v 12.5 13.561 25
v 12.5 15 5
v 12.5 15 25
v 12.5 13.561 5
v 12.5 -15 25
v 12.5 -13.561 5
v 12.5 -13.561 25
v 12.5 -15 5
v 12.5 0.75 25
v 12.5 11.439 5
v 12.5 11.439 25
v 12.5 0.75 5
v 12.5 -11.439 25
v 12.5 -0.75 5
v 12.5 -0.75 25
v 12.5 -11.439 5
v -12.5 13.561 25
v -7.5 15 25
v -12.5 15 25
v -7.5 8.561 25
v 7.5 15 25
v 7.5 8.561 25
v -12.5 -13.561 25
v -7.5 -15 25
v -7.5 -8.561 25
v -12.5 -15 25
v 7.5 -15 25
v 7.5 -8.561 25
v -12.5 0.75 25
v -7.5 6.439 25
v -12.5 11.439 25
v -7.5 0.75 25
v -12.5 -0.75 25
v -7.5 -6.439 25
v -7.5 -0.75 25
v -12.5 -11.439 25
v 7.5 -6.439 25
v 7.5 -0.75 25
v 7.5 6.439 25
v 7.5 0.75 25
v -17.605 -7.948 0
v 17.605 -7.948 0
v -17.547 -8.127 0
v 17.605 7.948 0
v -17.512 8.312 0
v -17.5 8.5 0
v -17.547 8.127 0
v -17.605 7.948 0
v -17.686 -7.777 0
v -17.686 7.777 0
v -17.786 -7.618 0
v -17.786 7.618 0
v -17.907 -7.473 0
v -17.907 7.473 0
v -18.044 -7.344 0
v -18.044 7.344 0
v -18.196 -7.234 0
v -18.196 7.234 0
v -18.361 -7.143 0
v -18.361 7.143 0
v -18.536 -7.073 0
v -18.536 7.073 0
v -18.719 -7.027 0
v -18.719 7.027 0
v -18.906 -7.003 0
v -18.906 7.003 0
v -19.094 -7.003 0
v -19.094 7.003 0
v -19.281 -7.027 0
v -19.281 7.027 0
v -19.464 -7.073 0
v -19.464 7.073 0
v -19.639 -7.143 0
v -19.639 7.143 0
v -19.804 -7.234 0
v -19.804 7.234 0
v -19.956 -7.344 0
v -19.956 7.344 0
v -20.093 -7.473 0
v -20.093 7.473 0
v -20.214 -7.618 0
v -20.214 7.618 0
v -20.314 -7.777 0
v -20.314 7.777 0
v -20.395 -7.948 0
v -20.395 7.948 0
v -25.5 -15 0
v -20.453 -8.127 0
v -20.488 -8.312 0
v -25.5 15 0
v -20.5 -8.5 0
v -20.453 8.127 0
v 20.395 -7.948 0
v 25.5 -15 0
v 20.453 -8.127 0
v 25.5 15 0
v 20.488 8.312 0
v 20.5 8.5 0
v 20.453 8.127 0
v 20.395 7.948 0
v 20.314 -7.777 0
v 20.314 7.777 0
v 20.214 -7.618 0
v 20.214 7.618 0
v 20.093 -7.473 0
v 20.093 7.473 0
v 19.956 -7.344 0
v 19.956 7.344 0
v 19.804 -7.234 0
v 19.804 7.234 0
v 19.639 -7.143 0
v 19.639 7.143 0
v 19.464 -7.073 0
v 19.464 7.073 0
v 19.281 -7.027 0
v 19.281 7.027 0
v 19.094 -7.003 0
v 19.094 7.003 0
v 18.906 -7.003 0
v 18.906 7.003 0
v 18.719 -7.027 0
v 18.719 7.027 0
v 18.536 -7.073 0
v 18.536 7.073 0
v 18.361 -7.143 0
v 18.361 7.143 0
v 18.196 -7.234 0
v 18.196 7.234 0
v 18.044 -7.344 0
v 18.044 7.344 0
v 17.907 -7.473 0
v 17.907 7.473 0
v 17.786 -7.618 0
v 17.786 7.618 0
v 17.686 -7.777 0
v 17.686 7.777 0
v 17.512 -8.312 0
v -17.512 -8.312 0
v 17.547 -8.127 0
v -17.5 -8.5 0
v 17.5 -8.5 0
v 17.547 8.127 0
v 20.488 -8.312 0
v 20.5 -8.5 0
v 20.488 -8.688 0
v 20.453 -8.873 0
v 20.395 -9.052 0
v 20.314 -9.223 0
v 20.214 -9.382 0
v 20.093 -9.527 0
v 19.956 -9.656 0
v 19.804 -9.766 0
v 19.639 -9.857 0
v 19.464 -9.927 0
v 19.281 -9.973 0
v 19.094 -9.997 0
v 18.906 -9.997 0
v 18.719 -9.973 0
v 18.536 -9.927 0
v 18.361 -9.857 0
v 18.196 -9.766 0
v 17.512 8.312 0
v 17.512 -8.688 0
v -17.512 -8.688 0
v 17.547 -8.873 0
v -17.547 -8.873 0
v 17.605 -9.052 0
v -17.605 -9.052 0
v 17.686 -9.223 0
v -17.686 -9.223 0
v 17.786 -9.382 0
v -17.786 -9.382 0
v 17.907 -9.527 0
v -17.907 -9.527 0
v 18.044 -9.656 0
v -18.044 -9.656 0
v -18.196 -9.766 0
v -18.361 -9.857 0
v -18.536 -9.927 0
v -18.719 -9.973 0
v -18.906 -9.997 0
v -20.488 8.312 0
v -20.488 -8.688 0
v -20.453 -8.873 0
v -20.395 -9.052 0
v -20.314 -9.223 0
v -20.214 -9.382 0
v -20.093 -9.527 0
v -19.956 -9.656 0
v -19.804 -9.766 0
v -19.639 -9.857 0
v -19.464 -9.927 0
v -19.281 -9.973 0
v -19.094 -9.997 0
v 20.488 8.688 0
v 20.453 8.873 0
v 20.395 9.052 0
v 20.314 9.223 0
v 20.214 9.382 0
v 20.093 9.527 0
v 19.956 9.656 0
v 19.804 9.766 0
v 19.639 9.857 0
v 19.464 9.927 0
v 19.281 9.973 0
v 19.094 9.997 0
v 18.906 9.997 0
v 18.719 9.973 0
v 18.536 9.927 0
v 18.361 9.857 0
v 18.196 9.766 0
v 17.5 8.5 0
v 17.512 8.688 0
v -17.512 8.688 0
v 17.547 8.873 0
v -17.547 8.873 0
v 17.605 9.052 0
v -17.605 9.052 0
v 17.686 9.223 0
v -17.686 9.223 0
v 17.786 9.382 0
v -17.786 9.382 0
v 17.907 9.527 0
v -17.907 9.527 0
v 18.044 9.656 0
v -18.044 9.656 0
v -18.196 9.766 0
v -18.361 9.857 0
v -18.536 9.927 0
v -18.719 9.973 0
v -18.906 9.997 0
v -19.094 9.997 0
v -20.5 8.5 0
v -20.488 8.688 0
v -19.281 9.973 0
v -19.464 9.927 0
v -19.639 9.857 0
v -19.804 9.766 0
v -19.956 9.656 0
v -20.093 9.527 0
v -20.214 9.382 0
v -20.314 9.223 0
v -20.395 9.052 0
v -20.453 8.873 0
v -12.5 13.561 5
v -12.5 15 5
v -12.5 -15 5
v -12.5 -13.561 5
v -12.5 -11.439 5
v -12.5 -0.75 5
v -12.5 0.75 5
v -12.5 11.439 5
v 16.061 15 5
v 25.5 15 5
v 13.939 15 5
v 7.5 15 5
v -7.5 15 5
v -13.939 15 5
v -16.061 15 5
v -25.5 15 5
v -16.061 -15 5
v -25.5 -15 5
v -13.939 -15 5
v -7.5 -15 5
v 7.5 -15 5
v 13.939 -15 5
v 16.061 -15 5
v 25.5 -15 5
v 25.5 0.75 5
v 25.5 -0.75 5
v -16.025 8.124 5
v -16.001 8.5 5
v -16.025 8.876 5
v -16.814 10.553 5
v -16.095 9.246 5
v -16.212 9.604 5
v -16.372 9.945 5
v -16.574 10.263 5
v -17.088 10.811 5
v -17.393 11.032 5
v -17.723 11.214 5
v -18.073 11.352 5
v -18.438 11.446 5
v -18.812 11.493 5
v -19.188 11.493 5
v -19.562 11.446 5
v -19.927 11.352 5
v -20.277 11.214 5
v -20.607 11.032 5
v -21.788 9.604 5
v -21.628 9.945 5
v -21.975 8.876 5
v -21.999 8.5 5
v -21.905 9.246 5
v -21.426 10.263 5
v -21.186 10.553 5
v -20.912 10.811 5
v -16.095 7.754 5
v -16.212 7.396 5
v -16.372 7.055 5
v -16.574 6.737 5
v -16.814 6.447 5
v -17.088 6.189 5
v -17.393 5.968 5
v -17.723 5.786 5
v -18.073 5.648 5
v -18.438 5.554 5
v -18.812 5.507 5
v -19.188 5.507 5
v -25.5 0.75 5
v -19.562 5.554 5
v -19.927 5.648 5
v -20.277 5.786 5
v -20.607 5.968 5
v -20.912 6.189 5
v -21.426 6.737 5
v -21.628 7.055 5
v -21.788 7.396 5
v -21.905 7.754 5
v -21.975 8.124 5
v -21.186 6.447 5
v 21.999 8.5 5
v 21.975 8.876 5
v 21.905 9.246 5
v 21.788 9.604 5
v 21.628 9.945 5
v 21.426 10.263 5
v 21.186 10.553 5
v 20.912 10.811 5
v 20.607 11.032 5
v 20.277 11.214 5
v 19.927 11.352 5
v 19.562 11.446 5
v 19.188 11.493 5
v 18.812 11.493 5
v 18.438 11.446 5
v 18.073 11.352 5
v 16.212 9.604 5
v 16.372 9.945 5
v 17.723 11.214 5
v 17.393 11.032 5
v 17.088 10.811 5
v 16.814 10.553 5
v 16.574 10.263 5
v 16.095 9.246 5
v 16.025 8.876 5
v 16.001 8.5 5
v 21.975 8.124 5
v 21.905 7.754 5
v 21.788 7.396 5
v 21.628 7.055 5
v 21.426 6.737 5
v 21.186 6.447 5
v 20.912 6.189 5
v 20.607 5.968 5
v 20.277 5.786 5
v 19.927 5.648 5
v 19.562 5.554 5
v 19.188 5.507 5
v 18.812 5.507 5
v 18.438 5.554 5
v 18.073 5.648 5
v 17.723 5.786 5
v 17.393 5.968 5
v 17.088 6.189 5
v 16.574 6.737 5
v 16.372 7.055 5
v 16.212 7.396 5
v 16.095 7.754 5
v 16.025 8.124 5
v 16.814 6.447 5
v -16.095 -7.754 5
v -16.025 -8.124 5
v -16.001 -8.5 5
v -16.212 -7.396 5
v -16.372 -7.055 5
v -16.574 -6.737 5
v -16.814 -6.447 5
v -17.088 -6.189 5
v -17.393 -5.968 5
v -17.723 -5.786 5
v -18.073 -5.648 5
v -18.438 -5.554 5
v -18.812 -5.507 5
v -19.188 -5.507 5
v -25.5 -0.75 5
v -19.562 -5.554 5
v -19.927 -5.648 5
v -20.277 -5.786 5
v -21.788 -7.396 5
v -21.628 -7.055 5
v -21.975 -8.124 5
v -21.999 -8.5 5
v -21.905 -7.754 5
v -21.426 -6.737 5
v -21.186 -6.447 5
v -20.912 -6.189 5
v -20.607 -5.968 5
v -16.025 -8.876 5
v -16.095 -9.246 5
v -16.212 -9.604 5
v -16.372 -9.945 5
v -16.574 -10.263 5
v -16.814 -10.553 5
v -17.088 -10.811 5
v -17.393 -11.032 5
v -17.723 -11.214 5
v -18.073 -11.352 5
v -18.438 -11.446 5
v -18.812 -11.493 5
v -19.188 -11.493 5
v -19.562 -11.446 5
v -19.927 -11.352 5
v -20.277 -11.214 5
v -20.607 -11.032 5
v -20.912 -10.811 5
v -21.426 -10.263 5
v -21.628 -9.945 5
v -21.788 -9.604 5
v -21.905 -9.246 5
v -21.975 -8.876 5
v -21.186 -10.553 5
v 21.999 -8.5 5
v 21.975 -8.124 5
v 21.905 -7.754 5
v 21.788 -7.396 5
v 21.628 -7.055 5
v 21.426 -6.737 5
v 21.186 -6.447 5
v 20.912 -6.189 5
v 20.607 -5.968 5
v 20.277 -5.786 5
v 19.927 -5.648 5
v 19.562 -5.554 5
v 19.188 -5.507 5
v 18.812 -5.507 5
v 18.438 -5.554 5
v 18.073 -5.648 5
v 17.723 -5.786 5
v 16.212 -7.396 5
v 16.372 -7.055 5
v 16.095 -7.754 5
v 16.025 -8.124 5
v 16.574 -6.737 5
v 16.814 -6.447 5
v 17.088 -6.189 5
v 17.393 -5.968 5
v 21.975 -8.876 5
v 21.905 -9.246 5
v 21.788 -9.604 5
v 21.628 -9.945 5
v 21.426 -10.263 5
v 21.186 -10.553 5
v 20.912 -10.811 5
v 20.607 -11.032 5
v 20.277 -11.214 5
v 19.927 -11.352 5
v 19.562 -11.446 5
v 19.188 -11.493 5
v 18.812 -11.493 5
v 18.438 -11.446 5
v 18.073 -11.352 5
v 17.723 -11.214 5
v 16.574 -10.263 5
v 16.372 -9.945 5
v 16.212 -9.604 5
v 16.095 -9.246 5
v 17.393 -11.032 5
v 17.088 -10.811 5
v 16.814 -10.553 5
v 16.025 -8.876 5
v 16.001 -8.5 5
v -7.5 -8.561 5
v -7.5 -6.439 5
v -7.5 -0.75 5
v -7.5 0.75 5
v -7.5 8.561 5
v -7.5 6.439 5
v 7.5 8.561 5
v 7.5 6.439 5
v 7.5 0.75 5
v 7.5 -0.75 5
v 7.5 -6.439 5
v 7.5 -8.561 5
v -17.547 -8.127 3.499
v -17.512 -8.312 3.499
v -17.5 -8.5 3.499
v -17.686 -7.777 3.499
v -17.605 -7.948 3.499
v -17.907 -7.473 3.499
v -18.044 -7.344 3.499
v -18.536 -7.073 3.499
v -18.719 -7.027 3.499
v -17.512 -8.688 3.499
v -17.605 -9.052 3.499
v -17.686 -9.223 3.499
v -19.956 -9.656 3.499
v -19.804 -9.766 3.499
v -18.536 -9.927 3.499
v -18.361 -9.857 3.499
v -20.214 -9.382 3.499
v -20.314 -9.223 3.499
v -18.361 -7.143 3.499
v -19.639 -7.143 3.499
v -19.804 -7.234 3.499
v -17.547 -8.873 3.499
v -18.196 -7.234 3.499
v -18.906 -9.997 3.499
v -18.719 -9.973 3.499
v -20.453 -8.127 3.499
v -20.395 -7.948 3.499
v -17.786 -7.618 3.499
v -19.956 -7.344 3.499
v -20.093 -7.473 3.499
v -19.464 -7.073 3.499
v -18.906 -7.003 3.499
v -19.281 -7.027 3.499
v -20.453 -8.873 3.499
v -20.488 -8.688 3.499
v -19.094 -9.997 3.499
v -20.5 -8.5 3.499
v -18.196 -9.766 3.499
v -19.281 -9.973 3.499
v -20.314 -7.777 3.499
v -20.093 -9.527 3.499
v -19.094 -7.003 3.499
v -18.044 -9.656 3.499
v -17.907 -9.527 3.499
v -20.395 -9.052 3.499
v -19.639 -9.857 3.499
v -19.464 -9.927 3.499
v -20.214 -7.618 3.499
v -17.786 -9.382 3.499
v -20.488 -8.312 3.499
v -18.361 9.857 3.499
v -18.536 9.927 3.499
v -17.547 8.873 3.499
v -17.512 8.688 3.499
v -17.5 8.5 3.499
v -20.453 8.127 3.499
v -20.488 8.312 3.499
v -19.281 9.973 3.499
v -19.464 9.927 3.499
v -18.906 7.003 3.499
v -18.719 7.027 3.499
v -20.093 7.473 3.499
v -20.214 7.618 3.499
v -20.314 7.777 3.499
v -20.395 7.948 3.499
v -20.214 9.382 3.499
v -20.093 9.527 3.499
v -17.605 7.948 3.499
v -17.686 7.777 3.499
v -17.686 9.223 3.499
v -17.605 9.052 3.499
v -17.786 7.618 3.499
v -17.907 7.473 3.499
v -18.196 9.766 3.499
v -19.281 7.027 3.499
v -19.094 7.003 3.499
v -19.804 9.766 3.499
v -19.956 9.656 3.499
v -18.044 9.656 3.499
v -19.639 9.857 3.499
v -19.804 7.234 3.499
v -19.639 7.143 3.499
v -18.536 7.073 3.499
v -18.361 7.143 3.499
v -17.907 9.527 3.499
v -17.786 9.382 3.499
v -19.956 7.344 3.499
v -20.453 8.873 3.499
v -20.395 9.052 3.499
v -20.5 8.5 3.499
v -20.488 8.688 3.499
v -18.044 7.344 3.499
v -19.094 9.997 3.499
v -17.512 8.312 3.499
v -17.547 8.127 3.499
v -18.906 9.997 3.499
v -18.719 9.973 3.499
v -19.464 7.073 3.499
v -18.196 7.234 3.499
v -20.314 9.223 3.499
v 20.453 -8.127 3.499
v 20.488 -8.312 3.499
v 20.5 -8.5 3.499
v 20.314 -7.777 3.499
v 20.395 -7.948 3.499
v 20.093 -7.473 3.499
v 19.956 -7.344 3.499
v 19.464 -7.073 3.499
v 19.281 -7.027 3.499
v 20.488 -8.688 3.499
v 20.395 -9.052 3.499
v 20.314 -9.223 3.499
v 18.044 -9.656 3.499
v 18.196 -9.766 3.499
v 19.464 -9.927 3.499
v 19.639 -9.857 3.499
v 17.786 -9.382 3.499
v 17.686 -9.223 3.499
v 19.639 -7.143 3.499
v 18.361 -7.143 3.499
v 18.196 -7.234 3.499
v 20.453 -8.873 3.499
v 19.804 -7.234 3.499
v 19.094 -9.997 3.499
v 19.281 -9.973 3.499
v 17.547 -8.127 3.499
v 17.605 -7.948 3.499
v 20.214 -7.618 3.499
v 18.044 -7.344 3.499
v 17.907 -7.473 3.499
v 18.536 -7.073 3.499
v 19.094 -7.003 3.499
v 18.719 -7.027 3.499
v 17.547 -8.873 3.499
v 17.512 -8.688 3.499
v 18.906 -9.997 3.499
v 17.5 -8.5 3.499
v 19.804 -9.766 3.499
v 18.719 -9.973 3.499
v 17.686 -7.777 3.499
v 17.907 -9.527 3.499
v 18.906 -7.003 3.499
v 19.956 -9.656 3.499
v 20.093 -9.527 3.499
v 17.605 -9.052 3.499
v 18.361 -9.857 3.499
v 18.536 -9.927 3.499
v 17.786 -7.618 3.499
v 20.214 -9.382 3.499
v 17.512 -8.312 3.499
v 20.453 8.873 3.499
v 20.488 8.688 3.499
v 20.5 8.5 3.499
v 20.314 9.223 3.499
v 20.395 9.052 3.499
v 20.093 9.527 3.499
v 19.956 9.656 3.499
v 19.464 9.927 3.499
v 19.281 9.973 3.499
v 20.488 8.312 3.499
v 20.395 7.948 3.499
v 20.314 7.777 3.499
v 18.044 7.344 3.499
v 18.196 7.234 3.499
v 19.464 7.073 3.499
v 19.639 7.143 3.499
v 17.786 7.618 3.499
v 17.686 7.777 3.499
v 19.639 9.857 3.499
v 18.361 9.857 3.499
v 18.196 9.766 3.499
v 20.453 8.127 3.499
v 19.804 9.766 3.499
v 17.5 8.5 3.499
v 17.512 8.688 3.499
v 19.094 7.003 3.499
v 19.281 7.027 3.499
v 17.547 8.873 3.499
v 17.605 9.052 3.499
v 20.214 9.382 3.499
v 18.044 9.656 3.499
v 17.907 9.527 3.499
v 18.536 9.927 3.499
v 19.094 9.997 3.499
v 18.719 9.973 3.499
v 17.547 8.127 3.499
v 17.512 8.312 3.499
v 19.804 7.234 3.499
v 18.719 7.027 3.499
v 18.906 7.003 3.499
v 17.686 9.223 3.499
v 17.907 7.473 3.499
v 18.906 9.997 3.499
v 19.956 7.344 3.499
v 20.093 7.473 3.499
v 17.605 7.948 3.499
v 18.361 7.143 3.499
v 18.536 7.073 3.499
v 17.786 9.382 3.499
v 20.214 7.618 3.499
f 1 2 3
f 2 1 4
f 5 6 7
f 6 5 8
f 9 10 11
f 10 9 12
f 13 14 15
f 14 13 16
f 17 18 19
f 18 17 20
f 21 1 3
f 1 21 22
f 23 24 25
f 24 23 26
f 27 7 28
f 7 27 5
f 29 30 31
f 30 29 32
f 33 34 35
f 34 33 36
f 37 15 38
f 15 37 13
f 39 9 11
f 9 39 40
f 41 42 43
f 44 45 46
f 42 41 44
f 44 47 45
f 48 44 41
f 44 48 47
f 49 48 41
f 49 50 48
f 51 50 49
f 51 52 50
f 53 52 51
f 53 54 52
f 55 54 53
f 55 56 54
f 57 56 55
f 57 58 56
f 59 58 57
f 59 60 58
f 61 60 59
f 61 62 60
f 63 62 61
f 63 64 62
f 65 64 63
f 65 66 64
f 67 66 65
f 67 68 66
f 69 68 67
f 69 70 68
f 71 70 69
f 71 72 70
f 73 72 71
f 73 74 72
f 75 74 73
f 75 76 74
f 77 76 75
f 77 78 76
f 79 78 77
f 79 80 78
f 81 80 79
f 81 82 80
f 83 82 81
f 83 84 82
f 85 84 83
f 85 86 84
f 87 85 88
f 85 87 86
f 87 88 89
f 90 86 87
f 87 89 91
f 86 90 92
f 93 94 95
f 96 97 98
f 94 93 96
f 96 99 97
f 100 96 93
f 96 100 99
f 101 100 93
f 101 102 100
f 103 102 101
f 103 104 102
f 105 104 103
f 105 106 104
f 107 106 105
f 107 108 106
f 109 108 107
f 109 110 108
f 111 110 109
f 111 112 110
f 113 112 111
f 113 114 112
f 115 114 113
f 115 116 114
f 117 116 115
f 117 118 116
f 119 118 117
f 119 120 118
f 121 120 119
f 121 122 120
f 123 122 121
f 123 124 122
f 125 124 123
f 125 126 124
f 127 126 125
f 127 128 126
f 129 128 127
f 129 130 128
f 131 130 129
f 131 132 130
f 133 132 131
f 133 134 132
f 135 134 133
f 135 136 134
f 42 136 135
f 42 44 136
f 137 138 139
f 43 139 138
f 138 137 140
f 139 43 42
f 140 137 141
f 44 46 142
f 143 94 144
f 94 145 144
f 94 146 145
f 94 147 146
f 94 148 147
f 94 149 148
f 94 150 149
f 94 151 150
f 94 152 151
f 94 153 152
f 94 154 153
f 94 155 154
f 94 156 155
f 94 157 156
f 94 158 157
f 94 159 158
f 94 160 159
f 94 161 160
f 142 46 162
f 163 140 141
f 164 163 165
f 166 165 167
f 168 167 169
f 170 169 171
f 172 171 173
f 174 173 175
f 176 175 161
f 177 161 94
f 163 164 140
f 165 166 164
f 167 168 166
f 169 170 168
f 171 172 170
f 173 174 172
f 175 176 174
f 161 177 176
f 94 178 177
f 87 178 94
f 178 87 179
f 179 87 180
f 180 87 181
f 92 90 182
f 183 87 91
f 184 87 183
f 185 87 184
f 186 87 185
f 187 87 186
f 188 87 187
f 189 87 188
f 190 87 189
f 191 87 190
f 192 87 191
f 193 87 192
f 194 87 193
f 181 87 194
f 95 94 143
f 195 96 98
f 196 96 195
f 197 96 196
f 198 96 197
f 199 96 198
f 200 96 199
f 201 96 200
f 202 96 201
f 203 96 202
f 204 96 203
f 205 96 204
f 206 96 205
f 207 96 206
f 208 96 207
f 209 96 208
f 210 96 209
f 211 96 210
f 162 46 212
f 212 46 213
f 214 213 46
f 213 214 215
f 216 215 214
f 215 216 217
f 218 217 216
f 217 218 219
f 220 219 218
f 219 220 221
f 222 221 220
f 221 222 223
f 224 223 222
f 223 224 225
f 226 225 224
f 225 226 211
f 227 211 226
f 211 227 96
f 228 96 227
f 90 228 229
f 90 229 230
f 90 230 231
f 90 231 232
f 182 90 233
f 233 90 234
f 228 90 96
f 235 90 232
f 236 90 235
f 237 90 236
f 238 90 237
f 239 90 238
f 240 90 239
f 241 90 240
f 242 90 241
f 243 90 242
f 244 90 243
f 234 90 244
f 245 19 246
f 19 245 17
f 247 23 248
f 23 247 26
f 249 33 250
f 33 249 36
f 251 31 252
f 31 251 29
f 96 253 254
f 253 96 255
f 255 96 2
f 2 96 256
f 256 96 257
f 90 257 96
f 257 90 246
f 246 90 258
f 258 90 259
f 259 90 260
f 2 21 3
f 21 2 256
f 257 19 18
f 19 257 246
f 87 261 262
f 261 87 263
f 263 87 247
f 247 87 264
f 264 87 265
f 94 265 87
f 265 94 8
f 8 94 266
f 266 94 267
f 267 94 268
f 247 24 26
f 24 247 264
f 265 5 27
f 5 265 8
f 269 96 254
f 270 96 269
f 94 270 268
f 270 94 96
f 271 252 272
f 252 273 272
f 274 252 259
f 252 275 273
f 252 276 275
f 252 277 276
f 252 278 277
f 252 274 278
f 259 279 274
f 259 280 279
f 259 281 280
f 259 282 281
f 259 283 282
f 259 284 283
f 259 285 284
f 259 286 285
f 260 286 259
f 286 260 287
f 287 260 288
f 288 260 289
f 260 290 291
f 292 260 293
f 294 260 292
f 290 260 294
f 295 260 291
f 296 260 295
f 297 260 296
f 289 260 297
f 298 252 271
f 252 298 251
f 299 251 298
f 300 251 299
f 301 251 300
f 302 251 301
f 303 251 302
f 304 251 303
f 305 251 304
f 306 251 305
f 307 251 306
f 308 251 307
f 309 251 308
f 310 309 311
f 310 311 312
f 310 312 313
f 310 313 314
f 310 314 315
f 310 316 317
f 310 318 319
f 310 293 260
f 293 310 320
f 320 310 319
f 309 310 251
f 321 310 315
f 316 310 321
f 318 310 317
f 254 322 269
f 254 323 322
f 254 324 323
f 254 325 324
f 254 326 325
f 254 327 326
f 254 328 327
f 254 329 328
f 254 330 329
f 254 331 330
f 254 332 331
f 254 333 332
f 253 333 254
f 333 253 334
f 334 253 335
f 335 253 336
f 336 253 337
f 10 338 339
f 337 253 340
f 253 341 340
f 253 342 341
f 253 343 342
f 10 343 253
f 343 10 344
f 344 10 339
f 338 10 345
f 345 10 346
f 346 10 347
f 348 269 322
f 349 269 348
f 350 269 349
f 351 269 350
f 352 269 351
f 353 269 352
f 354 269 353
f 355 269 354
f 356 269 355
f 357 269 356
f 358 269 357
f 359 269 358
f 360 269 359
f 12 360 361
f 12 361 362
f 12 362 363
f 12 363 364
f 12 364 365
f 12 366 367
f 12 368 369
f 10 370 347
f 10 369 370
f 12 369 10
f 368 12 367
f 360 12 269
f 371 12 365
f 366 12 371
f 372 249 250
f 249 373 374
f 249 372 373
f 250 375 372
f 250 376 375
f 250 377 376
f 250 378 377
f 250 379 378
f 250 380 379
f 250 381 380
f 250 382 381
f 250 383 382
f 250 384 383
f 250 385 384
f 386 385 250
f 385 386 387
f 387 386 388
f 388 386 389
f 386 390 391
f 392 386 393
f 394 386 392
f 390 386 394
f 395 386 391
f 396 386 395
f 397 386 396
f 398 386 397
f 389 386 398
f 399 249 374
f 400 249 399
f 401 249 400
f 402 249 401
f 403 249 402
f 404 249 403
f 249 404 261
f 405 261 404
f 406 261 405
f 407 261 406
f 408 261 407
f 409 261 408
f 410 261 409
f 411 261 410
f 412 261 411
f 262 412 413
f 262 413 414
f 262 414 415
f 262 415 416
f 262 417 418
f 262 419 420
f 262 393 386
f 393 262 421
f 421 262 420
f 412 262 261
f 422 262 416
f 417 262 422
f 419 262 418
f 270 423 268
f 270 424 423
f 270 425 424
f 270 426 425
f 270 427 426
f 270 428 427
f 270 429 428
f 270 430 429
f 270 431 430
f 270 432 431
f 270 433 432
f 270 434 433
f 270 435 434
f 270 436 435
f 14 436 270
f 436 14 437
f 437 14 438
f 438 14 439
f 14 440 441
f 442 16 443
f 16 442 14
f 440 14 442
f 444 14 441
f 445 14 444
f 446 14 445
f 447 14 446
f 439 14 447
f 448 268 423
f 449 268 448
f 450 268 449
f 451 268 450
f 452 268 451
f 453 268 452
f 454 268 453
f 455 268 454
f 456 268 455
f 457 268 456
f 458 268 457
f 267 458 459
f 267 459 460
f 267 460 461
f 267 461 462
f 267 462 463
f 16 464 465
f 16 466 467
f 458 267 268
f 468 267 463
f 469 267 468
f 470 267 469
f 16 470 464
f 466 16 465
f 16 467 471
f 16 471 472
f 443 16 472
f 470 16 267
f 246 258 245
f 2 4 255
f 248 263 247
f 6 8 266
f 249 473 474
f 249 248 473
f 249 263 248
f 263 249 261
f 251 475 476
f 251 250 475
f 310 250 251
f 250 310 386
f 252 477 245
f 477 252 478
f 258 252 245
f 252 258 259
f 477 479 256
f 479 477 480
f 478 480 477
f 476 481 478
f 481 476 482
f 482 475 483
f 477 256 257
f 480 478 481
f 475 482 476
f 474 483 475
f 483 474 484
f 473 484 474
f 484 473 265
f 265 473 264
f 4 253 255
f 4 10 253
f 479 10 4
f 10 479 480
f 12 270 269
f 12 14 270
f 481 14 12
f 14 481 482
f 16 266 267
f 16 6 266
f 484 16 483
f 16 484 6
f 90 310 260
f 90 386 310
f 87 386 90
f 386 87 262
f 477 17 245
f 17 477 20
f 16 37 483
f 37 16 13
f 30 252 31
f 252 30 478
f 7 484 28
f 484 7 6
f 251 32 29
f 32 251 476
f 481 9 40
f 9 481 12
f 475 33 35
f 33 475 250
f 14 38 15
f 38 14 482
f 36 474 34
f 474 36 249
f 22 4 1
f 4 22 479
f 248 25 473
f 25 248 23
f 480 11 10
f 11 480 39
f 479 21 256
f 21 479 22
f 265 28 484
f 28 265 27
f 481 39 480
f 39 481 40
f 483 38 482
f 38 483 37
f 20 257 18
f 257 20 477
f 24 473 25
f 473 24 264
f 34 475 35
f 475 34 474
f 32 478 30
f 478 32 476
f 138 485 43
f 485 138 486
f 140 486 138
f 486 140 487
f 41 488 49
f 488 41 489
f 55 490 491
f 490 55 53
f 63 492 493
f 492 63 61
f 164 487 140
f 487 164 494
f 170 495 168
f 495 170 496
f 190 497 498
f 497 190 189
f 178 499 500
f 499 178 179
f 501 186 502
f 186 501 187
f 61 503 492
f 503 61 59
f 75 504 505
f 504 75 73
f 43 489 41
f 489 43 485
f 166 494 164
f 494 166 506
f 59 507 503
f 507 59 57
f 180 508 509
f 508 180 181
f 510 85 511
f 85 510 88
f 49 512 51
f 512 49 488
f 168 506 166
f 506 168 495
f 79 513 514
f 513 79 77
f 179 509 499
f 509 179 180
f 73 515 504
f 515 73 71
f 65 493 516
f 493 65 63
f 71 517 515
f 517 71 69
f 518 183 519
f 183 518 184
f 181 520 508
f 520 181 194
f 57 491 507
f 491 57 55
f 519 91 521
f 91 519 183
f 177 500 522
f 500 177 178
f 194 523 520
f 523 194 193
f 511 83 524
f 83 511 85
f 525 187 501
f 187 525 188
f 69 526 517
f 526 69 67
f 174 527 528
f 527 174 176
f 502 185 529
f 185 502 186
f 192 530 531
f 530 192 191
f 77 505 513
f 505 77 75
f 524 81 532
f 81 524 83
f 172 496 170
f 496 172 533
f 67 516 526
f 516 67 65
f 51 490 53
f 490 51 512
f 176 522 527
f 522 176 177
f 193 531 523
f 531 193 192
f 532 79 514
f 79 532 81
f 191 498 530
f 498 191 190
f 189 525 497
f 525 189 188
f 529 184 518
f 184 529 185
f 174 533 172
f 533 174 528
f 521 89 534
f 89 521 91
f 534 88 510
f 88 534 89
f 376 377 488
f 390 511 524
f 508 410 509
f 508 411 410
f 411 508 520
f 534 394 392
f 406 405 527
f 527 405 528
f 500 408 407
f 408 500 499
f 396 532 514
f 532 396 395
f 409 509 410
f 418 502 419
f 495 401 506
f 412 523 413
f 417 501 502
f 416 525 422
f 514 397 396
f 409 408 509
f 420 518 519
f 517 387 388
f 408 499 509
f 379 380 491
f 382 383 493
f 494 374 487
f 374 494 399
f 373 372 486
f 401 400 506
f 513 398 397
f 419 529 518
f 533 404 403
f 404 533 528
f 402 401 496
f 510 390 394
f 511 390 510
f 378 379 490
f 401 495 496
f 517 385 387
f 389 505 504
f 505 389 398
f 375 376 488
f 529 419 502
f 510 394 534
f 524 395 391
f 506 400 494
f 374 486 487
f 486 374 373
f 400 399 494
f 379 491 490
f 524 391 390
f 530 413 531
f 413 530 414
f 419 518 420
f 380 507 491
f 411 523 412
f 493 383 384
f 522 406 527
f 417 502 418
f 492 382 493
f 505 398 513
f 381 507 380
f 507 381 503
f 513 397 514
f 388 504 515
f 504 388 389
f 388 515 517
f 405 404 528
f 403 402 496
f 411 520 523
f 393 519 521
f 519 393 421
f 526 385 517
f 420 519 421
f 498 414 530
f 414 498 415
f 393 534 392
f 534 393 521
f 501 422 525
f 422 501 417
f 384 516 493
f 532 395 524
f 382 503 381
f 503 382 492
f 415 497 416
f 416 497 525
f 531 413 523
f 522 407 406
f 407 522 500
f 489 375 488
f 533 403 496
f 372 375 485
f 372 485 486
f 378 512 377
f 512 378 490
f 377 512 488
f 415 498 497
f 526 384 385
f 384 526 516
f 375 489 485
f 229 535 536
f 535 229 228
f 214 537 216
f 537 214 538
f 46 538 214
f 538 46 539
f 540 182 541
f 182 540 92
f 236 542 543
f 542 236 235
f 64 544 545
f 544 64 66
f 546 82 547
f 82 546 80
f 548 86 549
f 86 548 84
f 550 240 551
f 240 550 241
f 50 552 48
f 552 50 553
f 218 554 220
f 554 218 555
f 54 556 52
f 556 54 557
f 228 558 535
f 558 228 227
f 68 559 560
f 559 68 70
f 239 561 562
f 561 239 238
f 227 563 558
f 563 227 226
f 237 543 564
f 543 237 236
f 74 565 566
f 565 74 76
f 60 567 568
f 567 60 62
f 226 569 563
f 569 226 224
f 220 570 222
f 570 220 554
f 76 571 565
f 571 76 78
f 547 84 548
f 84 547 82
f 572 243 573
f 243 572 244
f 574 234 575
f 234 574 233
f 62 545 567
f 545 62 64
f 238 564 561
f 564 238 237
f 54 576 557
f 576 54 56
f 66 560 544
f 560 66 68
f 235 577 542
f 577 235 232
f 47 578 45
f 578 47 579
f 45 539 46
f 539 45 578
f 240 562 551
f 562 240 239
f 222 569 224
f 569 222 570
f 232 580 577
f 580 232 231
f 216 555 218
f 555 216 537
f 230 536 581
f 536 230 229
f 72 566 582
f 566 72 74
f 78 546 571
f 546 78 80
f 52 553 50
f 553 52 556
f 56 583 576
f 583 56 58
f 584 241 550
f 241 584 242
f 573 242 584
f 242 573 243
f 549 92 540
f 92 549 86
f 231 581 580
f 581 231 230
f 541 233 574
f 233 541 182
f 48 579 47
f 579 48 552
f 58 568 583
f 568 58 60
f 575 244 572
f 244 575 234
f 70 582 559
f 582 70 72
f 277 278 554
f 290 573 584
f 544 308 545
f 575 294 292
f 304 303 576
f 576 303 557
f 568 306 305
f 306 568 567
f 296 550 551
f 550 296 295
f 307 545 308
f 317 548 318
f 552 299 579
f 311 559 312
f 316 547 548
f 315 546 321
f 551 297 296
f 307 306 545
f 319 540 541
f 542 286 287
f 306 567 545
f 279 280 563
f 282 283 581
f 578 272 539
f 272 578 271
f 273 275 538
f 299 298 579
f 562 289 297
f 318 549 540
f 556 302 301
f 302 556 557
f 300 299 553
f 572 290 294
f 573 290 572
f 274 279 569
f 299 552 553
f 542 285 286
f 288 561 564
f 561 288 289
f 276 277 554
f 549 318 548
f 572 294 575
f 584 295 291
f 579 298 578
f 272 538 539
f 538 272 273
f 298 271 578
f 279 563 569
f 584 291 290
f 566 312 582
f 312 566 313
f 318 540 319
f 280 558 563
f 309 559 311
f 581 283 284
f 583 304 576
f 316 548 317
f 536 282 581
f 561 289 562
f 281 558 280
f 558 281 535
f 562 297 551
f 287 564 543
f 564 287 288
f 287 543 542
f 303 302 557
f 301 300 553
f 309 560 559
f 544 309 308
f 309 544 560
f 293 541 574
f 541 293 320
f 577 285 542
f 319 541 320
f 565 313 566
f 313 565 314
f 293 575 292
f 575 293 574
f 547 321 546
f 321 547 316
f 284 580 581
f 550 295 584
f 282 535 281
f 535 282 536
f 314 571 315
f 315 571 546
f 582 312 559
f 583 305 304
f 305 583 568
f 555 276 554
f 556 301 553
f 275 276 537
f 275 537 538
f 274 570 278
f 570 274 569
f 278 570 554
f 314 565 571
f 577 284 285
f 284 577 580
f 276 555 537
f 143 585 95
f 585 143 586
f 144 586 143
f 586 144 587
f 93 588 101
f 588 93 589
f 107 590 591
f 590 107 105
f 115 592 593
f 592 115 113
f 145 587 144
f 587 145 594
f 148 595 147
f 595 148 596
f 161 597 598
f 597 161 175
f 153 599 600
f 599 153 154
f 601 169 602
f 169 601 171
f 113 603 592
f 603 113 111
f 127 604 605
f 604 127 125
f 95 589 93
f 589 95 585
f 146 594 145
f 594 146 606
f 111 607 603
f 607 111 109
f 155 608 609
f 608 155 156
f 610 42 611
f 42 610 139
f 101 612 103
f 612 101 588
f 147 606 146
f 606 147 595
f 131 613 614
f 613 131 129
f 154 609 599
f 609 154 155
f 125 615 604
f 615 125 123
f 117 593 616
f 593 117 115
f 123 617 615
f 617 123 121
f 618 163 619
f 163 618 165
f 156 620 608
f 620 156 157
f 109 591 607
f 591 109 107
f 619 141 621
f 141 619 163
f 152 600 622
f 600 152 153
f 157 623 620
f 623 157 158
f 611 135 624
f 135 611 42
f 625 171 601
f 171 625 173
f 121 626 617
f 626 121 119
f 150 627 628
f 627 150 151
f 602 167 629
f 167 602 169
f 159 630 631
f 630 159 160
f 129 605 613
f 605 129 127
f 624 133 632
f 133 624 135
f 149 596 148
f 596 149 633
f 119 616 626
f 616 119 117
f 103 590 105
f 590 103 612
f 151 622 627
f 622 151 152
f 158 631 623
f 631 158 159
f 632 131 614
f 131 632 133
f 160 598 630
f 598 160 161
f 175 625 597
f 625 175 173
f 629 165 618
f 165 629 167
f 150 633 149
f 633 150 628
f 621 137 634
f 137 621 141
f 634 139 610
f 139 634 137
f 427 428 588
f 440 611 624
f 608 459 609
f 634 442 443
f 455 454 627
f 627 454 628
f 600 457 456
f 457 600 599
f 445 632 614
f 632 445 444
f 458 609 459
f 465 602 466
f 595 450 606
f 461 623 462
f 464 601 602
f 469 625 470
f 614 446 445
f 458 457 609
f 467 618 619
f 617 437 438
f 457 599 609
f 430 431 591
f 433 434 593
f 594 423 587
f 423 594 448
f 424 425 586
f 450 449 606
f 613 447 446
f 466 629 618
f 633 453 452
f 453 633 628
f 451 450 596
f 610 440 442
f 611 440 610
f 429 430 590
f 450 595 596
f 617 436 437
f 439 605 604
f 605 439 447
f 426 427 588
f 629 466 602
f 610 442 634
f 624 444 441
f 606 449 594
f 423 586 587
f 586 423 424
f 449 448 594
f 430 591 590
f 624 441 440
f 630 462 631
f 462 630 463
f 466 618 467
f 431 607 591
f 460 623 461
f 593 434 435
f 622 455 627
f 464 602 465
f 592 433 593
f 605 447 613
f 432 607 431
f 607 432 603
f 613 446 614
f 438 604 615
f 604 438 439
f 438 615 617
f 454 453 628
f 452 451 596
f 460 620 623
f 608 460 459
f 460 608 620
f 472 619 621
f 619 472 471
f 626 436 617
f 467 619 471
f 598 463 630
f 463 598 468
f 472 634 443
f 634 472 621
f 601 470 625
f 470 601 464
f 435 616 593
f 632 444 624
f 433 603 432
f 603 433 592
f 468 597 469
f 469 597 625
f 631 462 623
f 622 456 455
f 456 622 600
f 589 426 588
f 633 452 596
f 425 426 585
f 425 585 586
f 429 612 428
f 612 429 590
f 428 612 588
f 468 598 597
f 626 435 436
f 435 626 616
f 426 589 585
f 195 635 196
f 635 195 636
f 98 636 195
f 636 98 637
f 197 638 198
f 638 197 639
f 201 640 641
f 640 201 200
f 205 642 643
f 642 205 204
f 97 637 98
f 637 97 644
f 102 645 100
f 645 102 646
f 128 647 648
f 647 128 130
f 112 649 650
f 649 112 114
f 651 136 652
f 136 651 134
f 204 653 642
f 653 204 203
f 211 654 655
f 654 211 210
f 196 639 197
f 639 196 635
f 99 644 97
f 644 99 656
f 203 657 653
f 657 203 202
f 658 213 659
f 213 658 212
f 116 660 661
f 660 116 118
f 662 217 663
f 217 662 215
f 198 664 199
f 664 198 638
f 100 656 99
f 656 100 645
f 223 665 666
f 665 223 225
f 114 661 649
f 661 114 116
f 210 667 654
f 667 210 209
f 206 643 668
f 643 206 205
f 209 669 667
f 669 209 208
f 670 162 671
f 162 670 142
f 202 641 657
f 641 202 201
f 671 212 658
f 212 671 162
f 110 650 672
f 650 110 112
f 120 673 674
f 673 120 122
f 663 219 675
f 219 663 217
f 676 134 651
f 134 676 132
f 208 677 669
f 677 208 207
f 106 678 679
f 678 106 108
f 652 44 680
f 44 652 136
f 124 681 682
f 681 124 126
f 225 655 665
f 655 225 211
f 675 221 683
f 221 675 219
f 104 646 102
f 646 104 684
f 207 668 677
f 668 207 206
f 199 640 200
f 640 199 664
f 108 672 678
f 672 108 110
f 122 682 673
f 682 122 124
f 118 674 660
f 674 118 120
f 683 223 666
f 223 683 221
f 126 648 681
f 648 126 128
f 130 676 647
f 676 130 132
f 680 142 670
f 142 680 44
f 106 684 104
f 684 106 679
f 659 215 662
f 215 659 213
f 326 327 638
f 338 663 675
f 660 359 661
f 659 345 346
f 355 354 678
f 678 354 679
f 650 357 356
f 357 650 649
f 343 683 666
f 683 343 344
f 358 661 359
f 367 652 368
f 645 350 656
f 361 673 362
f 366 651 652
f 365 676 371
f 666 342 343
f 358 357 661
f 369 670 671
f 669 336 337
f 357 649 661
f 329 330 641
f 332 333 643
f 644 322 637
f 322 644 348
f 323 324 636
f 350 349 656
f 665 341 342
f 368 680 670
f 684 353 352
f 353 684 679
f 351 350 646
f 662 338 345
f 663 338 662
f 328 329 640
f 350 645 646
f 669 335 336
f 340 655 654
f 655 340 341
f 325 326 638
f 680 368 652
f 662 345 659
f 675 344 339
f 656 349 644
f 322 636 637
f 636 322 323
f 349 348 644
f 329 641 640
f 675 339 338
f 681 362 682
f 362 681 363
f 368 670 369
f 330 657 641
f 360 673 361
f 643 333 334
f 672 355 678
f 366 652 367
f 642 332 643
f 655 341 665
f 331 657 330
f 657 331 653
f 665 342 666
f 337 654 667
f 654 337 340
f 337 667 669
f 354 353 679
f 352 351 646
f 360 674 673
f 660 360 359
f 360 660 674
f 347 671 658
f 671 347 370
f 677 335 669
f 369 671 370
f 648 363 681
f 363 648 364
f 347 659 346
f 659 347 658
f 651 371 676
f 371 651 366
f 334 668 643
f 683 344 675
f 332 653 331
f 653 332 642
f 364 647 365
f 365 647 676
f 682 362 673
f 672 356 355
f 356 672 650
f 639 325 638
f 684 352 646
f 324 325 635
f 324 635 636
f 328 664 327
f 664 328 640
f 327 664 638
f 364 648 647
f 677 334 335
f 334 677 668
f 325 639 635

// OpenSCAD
$fn = 50;

width = 15;
length = 30;
height = 20;
extraBaseWidth = 13;

wallThickness = 5;
slitWidth = 1.5;

screwRadius = 1.5;

miter();

module miter()
{
    difference()
    {
        union()
        {
            centerCube(width + 2 * wallThickness, length, wallThickness + height);
            centerCube(width + 2 * wallThickness + 2 * extraBaseWidth, length, wallThickness);
        }
        translate([0, 0, wallThickness])
        {
            centerCube(width, length + 0.1, height + 0.1);
            for(i = [-1:1:1])
            {
                rotate([0, 0, i * 45])
                {
                    centerCube(width + length + 2 * wallThickness + 0.1, slitWidth, height + 0.1);
                }
            }
        }
        for(i = [-1:2:1])
        {
            for(j = [-1:2:1])
            {
                translate([i * (width / 2 + wallThickness + extraBaseWidth / 2), j * (length / 2 - extraBaseWidth / 2), -0.1])
                {
                    cylinder(r = screwRadius, h = wallThickness - screwRadius + 0.1);
                    translate([0, 0, wallThickness - screwRadius + 0.1 - 0.001])
                    {
                        cylinder(r1 = screwRadius, r2 = 2 * screwRadius, h = screwRadius + 0.002);
                    }
                }
            }
        }
    }
}

module centerCube(x, y, z)
{
    translate([-x / 2, -y / 2, 0])
    {
        cube([x, y, z]);
    }
}
